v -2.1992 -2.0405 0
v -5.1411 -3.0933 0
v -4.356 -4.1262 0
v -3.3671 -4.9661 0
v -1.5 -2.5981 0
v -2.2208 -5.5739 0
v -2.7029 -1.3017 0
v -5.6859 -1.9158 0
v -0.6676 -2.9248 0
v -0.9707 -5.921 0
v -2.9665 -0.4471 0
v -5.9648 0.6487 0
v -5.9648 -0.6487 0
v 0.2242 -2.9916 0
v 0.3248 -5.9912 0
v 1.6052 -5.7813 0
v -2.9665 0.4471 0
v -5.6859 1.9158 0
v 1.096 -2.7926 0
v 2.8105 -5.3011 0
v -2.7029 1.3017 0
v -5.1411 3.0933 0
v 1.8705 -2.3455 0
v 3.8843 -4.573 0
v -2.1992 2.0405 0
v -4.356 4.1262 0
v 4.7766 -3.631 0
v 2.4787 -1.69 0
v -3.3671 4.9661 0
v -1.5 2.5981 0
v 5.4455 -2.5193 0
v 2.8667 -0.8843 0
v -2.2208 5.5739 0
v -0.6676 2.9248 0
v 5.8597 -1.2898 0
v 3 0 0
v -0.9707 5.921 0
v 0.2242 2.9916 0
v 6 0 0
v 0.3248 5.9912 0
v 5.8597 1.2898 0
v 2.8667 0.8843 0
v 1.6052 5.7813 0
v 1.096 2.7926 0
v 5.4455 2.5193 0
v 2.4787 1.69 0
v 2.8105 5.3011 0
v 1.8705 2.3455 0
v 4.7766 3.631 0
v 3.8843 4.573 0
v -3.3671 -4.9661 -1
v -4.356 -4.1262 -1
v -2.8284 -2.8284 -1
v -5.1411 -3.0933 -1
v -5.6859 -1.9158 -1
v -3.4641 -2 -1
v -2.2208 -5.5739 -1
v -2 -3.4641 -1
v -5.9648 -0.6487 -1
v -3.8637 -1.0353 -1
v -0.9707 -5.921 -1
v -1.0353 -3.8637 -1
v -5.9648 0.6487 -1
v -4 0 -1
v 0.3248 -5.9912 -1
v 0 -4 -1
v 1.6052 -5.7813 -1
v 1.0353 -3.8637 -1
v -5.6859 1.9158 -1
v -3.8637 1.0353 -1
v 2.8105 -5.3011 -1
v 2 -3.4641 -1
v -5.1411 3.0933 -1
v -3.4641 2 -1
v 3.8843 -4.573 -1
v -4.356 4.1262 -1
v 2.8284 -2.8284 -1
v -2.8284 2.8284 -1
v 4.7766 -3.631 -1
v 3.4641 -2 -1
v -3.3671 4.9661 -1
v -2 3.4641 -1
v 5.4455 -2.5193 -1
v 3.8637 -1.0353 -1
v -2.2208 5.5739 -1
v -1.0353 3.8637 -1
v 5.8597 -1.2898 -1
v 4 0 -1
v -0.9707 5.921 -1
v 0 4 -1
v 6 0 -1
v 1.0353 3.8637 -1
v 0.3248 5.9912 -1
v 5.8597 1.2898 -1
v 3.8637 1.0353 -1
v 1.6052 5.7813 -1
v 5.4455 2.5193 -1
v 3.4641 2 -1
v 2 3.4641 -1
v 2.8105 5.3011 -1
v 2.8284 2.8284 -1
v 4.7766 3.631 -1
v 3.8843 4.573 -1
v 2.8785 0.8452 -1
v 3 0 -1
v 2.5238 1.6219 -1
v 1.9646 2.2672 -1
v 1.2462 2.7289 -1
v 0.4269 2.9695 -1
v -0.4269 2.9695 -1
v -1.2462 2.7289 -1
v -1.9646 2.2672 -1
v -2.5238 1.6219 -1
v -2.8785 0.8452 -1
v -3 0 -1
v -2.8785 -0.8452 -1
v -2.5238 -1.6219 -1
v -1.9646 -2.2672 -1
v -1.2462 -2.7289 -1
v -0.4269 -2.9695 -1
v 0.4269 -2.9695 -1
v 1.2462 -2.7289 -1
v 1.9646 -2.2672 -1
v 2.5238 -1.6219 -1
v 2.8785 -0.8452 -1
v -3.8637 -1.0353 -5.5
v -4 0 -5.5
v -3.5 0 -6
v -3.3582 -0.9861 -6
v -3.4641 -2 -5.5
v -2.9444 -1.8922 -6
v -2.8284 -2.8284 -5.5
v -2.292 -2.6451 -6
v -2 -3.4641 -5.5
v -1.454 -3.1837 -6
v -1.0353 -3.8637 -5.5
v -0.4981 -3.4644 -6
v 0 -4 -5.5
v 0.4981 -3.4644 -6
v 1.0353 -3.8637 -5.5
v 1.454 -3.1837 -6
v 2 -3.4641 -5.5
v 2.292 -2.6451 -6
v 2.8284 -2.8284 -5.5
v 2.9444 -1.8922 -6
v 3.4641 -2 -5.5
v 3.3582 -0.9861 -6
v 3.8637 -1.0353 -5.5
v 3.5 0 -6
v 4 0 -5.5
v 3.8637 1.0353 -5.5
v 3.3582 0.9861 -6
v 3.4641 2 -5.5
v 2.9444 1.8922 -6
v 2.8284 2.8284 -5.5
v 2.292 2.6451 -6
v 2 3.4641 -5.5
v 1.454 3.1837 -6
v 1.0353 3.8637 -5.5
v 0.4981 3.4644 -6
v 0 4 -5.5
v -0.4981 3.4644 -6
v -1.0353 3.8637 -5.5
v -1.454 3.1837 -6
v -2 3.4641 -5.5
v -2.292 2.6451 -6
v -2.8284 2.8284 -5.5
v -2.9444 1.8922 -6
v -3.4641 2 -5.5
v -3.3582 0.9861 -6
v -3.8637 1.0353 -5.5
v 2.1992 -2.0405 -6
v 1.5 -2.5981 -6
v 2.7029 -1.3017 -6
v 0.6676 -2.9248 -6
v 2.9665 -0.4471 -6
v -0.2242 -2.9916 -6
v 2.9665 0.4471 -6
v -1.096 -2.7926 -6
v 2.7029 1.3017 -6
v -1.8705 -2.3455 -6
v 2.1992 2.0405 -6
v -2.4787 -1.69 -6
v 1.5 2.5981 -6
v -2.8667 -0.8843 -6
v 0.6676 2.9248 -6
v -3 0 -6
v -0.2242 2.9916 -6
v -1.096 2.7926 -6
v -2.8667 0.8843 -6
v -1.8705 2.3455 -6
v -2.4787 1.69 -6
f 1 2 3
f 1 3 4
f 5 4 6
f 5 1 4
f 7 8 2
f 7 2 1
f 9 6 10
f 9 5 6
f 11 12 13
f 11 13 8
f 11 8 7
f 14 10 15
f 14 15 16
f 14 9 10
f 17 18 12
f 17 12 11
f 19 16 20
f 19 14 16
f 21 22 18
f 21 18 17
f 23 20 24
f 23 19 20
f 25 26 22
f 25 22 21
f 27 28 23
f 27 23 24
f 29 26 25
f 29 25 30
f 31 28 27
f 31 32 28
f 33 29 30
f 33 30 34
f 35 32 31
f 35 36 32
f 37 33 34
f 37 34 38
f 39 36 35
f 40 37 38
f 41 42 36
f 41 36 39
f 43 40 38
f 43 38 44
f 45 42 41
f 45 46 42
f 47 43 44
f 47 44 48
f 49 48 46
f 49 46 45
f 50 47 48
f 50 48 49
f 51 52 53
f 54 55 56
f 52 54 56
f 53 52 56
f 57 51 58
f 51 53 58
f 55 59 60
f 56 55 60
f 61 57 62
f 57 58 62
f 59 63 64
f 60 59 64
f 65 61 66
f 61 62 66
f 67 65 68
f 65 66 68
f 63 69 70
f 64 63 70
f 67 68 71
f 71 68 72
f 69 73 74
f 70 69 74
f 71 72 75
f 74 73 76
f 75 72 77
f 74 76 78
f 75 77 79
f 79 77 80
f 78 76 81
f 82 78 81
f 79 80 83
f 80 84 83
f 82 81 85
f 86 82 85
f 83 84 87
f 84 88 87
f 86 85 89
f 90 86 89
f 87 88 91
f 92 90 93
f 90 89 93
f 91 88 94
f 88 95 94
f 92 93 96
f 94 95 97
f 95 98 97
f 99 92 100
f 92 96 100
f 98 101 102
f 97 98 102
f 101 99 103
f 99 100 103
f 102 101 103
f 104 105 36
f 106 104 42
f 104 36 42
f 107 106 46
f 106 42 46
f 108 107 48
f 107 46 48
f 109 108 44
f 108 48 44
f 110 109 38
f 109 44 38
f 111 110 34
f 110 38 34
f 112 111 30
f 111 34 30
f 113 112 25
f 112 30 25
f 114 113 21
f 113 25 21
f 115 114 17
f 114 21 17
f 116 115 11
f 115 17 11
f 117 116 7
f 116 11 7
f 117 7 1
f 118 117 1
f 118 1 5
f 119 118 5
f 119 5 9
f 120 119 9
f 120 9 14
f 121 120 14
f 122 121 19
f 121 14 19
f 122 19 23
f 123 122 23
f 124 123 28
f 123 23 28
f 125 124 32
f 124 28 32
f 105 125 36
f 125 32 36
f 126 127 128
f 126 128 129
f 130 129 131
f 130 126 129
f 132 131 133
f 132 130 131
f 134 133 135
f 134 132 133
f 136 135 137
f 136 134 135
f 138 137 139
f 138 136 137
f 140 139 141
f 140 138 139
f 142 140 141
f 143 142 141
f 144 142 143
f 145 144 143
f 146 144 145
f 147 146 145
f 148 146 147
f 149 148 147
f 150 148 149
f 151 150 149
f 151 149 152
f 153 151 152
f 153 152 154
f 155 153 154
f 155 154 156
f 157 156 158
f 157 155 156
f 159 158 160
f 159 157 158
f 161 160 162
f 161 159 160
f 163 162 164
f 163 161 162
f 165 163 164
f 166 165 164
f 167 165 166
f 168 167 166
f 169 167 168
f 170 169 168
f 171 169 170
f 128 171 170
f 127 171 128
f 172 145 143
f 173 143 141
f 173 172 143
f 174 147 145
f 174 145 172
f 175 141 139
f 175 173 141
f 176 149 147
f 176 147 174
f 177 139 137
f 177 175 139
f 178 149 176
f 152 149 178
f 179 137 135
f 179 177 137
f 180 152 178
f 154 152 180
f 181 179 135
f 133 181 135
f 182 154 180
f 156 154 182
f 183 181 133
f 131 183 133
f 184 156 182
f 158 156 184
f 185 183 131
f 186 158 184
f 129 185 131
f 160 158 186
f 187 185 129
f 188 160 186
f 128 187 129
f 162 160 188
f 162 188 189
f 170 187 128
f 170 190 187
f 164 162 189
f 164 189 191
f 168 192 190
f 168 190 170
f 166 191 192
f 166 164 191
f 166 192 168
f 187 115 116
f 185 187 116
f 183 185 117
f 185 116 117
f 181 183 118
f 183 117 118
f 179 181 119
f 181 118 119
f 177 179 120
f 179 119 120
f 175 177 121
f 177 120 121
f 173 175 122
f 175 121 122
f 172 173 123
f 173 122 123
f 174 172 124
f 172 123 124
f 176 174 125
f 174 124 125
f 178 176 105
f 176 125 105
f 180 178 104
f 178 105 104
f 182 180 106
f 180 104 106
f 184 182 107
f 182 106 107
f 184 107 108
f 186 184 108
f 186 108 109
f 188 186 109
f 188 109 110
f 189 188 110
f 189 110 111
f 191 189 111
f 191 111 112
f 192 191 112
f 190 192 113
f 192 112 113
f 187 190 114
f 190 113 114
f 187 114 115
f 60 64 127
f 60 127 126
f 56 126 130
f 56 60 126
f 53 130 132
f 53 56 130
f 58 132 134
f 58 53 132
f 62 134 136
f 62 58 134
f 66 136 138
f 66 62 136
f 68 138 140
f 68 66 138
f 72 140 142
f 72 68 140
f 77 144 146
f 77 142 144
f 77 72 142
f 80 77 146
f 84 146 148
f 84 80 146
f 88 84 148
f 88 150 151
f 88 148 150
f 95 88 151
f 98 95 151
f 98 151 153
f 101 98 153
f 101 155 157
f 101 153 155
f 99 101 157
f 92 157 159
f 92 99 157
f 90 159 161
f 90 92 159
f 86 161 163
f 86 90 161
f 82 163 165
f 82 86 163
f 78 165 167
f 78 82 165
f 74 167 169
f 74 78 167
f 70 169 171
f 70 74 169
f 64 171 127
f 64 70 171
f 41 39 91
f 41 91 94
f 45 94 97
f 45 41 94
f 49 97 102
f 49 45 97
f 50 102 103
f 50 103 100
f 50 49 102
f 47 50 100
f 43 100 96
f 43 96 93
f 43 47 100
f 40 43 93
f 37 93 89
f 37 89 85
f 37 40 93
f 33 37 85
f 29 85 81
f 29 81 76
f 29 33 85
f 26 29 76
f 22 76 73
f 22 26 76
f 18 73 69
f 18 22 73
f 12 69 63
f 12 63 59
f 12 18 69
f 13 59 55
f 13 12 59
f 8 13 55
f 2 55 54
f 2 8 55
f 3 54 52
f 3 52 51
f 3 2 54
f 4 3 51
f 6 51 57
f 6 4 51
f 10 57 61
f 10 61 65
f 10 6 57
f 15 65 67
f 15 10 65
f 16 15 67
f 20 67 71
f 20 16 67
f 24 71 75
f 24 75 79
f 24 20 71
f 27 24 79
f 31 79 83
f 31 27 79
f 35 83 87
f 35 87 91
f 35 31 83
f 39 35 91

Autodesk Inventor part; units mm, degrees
ref_plane "YZ Plane" through (0, 0, 0) normal (1, 0, 0) x (0, 1, 0)
ref_plane "XZ Plane" through (0, 0, 0) normal (0, 1, 0) x (-1, 0, 0)
ref_plane "XY Plane" through (0, 0, 0) normal (0, 0, 1) x (1, 0, 0)
sketch "Sketch1" plane through (0, 0, 0) normal (0, 0, 1) x (1, 0, 0)
  circle A0 centre (0, 0) radius 3
  circle A1 centre (0, 0) radius 6
  dimension "d0" = 6
  dimension "d1" = 12
extrude "Extrusion1" add sketch "Sketch1" against normal blind 1
sketch "Sketch2" plane through (0, 0, -1) normal (0, 0, -1) x (-1, 0, 0)
  circle A0 centre (0, 0) radius 4
  circle A1 centre (0, 0) radius 3 projected
  dimension "d4" = 8
extrude "Extrusion2" add sketch "Sketch2" along normal blind 5
chamfer "Chamfer1" distance 0.5 angle 45 1 edges at (4, 0, -6)
properties part number "w5f6-12a" material "アセタール樹脂、黒"
